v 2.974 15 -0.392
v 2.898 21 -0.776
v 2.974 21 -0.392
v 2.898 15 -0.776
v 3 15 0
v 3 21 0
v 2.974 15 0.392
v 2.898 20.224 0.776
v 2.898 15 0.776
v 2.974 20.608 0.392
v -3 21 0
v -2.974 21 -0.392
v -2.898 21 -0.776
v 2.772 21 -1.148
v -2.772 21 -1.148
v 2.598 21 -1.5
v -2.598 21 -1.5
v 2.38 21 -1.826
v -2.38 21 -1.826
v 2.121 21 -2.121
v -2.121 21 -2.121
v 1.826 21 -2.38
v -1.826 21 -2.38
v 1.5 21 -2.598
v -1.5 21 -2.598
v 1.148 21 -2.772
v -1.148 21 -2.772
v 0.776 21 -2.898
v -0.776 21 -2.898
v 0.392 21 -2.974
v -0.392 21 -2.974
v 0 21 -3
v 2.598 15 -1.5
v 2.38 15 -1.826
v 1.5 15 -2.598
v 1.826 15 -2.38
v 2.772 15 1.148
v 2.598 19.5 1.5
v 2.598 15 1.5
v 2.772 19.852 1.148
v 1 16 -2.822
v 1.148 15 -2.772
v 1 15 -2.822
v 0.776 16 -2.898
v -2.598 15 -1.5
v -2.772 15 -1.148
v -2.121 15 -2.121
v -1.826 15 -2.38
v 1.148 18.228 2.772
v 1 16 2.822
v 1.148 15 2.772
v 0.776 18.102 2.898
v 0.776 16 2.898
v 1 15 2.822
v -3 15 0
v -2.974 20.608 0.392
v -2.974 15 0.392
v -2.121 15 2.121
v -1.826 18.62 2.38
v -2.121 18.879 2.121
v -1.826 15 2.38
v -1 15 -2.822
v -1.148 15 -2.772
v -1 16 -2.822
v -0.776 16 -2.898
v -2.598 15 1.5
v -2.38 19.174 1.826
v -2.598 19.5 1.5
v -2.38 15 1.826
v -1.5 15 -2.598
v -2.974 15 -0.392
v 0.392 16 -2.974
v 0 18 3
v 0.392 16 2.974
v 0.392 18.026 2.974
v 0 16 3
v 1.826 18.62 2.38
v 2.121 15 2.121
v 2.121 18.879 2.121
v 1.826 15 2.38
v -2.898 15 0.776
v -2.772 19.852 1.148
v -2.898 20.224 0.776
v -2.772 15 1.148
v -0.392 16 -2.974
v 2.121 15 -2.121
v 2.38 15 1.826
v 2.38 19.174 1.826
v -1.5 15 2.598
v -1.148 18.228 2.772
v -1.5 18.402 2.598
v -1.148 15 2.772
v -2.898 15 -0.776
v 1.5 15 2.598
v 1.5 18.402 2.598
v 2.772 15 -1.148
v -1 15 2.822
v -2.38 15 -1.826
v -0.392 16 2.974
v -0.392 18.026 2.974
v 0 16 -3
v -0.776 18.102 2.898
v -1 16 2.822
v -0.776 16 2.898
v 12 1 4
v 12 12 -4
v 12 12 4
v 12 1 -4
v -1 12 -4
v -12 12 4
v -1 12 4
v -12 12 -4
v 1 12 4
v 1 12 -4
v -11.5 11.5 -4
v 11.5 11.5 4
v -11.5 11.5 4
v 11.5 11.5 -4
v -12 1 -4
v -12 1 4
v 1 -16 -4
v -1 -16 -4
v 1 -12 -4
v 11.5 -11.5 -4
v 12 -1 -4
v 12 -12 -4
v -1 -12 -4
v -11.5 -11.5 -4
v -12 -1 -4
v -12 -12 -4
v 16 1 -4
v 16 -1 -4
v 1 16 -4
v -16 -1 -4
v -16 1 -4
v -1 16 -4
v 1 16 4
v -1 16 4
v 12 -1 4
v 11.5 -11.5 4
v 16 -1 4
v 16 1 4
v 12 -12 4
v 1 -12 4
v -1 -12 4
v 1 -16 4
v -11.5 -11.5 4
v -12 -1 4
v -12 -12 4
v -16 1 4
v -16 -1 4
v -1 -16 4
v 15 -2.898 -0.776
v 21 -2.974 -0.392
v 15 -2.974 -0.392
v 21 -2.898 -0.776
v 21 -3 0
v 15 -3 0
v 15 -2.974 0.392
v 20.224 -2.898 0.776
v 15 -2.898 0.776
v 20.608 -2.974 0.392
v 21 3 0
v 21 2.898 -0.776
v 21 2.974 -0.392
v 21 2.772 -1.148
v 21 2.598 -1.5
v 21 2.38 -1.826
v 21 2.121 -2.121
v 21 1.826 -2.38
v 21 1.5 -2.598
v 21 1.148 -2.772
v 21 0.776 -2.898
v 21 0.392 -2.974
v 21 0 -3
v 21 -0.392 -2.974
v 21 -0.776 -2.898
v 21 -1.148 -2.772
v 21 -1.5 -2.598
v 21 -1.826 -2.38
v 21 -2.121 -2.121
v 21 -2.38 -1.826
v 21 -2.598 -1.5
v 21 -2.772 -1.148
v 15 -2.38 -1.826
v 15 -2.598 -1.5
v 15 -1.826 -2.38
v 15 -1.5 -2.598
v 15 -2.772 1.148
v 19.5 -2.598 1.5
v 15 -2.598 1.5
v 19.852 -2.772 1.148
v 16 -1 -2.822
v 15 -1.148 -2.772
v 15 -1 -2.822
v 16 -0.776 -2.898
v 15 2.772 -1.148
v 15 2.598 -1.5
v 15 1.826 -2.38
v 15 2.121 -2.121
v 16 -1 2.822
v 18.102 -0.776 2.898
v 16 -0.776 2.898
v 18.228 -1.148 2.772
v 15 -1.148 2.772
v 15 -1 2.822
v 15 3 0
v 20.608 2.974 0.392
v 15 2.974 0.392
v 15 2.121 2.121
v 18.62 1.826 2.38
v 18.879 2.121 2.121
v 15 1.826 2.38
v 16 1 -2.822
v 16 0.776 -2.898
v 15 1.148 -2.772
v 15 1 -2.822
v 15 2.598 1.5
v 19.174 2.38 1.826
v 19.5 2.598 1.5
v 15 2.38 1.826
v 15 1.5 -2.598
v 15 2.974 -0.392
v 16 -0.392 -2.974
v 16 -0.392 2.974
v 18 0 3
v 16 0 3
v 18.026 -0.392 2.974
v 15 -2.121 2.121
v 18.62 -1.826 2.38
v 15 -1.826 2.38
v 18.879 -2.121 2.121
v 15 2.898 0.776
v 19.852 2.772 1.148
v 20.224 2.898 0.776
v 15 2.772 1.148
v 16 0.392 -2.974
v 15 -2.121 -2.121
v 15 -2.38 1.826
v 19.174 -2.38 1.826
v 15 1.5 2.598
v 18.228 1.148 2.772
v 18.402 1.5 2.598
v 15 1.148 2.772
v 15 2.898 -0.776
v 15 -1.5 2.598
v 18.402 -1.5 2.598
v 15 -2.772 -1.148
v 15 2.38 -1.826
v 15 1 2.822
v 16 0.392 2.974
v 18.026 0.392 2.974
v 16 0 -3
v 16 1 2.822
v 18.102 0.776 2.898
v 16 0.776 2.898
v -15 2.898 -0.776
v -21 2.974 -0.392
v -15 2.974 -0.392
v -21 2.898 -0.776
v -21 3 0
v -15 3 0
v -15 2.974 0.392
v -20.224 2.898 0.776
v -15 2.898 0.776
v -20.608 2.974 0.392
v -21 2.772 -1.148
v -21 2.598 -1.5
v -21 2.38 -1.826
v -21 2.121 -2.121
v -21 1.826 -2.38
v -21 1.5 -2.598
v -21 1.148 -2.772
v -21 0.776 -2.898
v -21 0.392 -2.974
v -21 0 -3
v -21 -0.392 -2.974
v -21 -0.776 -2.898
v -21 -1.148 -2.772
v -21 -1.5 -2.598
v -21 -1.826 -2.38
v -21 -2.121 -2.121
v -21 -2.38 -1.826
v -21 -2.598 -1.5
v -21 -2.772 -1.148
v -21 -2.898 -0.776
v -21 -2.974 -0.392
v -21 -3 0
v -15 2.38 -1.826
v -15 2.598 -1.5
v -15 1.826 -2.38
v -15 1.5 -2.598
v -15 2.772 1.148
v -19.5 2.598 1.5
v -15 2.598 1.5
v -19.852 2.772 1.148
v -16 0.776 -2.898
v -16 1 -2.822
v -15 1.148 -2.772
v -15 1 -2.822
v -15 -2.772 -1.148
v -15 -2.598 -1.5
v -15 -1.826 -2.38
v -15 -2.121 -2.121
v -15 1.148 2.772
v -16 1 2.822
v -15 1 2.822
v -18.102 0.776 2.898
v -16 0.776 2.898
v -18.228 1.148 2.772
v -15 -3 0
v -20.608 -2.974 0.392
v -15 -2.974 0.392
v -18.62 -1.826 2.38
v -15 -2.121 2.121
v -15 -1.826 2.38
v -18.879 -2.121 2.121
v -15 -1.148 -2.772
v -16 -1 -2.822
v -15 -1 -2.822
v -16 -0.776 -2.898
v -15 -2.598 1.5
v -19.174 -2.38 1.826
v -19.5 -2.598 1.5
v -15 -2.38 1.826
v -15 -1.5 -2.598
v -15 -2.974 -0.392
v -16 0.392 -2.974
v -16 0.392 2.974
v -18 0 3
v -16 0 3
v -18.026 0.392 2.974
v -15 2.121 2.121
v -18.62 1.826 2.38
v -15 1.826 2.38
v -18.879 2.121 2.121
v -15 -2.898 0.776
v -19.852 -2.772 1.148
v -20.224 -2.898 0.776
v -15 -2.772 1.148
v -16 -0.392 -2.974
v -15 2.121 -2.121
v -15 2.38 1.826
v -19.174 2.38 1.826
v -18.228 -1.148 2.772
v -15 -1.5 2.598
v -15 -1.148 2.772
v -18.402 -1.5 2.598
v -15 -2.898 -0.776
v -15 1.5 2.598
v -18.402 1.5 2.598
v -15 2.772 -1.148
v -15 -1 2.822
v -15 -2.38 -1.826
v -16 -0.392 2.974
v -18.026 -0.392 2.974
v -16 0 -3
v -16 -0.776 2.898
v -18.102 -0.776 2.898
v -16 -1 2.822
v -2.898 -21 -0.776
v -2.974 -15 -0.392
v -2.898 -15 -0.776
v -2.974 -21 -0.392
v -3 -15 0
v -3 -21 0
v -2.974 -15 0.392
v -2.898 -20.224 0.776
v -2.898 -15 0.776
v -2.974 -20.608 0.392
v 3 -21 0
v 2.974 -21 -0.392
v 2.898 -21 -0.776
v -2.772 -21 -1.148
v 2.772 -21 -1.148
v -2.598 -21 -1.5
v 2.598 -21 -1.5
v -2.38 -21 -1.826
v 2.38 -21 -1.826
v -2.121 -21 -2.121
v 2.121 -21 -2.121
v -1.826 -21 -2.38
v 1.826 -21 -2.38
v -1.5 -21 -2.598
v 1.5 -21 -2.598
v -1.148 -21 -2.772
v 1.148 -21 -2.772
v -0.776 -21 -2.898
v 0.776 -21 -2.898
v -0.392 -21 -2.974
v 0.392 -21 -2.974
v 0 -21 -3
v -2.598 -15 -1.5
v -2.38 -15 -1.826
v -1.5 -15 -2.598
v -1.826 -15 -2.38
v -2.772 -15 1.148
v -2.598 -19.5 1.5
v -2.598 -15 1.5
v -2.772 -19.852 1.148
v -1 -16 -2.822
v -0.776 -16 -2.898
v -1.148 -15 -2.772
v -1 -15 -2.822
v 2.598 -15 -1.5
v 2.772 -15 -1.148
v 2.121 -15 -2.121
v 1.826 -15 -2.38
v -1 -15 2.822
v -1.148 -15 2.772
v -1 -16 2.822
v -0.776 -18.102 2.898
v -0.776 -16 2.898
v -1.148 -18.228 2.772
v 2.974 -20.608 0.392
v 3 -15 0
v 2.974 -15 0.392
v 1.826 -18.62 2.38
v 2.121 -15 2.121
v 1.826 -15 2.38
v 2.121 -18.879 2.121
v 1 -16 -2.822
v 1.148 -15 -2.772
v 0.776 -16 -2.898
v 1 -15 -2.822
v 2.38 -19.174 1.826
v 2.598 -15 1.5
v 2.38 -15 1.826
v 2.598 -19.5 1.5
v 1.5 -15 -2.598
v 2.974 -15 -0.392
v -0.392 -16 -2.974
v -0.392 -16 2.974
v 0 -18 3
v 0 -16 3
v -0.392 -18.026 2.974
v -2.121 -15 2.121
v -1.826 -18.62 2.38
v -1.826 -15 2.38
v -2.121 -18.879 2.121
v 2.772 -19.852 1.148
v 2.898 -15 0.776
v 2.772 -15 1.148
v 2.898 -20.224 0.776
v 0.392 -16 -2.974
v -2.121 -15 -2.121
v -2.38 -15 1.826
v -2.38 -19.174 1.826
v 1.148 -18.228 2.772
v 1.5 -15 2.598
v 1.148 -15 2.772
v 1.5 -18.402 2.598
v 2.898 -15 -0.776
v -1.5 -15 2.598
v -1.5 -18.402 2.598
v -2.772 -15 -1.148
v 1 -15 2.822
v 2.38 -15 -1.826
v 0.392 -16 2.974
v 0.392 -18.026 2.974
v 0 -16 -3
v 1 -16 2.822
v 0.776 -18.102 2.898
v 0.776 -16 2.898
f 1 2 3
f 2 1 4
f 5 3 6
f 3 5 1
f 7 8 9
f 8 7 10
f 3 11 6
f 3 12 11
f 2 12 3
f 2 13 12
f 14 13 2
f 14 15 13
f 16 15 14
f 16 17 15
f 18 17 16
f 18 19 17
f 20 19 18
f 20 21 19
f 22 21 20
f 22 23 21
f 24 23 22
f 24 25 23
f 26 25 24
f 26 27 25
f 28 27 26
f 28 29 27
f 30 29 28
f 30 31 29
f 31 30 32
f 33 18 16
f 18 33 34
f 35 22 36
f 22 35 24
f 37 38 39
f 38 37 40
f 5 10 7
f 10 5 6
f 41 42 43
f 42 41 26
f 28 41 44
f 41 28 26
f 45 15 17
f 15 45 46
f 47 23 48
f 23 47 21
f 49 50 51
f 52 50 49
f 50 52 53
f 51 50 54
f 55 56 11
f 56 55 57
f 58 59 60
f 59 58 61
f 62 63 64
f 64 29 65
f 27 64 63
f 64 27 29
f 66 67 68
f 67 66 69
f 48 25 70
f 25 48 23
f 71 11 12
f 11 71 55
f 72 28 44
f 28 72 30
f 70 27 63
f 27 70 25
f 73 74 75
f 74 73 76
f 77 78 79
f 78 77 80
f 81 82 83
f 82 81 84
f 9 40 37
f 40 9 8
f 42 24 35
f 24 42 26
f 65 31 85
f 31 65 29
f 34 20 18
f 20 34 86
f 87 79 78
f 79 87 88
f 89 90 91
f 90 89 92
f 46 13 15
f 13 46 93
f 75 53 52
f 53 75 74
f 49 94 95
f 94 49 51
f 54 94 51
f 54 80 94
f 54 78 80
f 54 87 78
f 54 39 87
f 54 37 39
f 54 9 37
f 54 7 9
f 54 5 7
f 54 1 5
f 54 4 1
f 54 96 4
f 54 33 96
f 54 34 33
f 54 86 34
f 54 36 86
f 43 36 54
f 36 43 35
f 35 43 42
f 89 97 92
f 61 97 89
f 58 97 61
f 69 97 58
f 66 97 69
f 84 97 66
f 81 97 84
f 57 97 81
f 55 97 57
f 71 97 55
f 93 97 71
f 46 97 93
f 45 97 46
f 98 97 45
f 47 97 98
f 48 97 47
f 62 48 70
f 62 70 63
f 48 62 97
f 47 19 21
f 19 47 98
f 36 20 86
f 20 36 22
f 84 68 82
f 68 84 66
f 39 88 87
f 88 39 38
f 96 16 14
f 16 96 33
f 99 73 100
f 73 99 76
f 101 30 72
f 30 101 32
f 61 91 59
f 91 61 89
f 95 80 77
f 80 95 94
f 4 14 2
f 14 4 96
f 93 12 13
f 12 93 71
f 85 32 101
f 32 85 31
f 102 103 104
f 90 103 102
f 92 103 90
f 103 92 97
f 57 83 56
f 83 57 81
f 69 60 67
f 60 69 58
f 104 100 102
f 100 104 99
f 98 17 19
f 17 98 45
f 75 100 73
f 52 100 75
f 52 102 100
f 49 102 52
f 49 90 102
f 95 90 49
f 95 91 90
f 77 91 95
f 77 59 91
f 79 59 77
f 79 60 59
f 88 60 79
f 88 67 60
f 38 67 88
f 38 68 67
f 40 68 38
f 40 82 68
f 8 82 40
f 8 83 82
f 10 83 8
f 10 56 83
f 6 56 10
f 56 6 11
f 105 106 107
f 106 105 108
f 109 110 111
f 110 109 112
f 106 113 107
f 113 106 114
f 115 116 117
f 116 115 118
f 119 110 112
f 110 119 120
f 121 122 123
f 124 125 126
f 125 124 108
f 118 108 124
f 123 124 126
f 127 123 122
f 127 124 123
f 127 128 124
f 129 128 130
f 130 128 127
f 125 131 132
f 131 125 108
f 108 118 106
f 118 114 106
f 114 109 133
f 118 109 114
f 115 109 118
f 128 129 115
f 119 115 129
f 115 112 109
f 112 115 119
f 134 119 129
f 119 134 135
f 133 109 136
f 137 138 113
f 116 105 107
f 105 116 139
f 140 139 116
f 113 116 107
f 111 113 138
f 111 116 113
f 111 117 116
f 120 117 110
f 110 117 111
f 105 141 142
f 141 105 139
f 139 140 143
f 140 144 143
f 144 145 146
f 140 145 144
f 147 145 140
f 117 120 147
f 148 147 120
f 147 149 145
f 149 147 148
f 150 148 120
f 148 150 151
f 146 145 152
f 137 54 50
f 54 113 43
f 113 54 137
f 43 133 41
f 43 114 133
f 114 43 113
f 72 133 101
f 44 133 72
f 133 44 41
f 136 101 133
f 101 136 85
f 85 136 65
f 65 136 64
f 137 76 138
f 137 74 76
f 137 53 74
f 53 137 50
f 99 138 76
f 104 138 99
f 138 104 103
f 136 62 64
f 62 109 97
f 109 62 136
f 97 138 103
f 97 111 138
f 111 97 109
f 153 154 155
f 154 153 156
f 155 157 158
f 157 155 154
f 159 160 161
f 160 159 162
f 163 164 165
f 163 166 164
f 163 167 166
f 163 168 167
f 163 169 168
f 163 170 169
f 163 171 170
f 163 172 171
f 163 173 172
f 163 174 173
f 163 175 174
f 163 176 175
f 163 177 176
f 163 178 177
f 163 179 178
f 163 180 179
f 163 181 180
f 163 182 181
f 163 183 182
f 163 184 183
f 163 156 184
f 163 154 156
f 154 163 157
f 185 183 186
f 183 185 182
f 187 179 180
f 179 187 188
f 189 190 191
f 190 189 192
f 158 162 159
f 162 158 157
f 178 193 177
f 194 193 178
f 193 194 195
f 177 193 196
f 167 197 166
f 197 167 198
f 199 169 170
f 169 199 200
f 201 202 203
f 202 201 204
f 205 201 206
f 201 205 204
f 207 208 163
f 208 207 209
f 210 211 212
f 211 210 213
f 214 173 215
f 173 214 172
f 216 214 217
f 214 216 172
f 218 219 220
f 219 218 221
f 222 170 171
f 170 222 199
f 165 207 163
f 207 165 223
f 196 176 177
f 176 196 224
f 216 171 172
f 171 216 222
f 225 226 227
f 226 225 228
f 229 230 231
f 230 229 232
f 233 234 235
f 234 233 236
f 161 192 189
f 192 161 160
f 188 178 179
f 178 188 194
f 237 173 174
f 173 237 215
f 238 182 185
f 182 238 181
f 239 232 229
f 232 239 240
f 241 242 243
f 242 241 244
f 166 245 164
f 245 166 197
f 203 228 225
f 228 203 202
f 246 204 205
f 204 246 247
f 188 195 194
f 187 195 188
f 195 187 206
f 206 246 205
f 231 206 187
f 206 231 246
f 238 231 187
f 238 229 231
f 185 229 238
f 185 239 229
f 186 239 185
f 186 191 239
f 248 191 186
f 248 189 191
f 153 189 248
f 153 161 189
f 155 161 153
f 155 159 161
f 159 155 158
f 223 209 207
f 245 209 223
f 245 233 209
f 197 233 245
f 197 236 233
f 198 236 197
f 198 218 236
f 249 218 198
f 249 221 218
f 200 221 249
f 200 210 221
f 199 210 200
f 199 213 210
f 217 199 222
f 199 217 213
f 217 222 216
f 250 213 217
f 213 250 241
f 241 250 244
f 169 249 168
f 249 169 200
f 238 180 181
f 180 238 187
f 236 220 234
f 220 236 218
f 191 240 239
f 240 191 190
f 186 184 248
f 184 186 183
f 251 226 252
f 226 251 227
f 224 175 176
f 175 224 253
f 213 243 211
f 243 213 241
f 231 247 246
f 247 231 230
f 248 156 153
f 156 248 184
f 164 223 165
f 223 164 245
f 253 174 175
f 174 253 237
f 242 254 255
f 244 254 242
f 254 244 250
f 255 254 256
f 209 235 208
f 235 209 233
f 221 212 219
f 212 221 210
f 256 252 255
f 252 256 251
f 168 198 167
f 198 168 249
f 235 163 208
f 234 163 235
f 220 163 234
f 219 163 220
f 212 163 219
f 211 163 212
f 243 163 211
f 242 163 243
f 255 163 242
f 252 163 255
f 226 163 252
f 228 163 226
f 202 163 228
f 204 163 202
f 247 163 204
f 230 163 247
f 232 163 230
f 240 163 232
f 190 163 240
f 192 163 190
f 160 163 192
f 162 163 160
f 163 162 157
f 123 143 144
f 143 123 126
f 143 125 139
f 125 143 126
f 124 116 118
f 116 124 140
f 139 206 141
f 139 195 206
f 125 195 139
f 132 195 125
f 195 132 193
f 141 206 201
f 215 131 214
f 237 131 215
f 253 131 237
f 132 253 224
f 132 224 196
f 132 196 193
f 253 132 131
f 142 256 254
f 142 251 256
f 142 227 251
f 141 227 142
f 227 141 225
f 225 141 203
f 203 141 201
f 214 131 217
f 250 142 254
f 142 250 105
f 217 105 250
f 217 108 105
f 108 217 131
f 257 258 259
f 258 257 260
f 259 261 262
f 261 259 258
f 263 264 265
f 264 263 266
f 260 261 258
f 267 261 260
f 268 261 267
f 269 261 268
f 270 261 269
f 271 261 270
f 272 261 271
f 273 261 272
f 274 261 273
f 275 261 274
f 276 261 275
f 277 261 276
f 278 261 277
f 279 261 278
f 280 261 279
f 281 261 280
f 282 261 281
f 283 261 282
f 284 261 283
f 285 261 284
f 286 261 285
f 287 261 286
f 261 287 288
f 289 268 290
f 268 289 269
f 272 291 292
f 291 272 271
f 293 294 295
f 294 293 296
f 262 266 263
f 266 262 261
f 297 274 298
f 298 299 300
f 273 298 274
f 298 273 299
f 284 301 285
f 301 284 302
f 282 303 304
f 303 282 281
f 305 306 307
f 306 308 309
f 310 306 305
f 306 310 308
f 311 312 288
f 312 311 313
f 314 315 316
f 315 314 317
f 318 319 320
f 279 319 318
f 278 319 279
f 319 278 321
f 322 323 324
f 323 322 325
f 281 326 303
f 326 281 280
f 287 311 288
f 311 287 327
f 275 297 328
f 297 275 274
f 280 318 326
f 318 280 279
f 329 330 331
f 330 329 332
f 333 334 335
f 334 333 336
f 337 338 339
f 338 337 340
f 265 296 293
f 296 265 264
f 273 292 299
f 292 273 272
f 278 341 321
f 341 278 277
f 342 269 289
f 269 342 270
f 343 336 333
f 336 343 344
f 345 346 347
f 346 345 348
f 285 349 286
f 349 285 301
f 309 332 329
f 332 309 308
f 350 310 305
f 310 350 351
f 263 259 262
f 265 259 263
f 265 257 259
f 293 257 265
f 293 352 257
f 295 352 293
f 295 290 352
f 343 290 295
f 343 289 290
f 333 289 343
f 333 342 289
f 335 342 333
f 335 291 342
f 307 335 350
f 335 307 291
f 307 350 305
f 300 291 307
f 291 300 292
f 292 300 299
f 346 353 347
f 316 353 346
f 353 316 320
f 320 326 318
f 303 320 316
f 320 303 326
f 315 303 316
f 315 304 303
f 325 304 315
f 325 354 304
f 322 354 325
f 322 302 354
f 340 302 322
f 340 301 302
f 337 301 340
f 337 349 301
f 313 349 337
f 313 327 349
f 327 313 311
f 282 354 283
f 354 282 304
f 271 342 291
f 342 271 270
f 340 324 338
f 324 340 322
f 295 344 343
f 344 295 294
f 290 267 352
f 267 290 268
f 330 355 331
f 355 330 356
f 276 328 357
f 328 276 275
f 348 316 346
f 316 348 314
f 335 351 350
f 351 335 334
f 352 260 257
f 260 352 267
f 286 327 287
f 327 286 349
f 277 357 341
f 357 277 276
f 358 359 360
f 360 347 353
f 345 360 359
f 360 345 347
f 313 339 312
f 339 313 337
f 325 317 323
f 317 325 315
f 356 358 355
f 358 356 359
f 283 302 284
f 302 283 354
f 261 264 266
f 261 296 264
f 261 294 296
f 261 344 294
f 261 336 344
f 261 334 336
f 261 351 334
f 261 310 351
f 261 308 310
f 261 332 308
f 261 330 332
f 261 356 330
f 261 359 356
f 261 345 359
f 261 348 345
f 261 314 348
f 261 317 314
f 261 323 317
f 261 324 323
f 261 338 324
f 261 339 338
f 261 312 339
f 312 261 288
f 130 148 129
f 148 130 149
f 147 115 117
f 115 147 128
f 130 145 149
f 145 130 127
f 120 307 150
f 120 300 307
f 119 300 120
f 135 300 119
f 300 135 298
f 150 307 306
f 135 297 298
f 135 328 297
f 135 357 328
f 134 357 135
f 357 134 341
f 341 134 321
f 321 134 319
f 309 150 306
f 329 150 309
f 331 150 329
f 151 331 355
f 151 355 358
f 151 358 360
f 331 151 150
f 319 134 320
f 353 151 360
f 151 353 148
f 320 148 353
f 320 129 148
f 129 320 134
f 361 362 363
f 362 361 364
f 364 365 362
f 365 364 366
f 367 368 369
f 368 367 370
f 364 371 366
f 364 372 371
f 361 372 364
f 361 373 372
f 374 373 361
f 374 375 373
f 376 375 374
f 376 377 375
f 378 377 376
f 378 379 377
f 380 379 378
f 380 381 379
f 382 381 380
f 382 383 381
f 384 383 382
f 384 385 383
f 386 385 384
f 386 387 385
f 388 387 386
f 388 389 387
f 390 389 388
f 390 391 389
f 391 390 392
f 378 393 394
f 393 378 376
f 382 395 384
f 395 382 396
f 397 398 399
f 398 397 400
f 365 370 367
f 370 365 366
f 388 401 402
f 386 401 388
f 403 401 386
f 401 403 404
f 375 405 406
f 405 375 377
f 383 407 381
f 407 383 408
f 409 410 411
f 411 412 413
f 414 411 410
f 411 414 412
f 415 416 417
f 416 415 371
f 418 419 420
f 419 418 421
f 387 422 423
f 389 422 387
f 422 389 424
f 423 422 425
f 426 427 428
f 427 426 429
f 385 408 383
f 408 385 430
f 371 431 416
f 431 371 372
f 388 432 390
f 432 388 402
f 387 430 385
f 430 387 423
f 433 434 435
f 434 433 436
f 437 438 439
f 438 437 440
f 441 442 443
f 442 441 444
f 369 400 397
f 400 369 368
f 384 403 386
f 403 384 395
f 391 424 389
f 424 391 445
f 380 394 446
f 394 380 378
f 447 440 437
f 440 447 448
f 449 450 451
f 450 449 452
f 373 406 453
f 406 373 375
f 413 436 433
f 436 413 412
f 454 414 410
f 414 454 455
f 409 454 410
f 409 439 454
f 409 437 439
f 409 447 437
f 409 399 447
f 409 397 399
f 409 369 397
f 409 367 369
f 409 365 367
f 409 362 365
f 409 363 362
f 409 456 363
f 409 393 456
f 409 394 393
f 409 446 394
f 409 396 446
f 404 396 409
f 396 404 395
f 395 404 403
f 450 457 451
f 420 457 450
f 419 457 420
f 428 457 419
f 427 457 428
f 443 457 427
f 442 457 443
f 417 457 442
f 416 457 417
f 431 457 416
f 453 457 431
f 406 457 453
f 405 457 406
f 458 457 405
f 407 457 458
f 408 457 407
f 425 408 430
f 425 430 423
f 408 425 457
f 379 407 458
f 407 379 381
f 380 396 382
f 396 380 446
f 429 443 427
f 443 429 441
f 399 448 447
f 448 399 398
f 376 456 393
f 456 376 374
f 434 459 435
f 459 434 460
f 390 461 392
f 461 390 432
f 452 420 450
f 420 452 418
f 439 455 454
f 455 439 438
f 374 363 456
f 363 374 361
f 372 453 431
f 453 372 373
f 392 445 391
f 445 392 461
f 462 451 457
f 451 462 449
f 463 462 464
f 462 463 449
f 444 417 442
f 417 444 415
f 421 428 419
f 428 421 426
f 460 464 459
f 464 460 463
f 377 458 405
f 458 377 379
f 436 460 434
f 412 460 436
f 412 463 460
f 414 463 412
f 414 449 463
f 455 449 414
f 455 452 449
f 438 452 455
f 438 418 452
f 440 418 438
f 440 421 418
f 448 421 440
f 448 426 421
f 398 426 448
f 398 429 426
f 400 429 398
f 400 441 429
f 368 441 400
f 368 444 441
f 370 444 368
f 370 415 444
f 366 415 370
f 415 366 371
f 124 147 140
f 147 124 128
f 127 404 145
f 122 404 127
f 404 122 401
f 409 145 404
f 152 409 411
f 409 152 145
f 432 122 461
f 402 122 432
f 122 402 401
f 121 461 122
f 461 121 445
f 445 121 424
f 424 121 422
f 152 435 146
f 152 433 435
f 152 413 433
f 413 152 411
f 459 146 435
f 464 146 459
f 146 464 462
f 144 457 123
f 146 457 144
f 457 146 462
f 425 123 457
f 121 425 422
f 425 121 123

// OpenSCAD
//$fn = 50;
$fa = 1;
$fs = 0.4;
module part1()
{
    translate([ -12, -4, 11.5 ])
    {
        cube([ 24, 8, 0.5 ]);
    }
    translate([ 0, 0, 14 ])
    {
        cube([ 2, 8, 4 ], center = true);
    }
    difference()
    {
        translate([ 0, 0, 15 ]) cylinder(h = 6, r = 3);
        translate([ -3, -3, 18 ]) rotate([ 45, 0, 0 ]) cube(6);
    }
}

rotate([ -90, 0, 0 ])
{
    part1();
    rotate([ 0, 90, 0 ]) part1();
    rotate([ 0, -90, 0 ]) part1();
    rotate([ 0, 180, 0 ]) part1();
}
